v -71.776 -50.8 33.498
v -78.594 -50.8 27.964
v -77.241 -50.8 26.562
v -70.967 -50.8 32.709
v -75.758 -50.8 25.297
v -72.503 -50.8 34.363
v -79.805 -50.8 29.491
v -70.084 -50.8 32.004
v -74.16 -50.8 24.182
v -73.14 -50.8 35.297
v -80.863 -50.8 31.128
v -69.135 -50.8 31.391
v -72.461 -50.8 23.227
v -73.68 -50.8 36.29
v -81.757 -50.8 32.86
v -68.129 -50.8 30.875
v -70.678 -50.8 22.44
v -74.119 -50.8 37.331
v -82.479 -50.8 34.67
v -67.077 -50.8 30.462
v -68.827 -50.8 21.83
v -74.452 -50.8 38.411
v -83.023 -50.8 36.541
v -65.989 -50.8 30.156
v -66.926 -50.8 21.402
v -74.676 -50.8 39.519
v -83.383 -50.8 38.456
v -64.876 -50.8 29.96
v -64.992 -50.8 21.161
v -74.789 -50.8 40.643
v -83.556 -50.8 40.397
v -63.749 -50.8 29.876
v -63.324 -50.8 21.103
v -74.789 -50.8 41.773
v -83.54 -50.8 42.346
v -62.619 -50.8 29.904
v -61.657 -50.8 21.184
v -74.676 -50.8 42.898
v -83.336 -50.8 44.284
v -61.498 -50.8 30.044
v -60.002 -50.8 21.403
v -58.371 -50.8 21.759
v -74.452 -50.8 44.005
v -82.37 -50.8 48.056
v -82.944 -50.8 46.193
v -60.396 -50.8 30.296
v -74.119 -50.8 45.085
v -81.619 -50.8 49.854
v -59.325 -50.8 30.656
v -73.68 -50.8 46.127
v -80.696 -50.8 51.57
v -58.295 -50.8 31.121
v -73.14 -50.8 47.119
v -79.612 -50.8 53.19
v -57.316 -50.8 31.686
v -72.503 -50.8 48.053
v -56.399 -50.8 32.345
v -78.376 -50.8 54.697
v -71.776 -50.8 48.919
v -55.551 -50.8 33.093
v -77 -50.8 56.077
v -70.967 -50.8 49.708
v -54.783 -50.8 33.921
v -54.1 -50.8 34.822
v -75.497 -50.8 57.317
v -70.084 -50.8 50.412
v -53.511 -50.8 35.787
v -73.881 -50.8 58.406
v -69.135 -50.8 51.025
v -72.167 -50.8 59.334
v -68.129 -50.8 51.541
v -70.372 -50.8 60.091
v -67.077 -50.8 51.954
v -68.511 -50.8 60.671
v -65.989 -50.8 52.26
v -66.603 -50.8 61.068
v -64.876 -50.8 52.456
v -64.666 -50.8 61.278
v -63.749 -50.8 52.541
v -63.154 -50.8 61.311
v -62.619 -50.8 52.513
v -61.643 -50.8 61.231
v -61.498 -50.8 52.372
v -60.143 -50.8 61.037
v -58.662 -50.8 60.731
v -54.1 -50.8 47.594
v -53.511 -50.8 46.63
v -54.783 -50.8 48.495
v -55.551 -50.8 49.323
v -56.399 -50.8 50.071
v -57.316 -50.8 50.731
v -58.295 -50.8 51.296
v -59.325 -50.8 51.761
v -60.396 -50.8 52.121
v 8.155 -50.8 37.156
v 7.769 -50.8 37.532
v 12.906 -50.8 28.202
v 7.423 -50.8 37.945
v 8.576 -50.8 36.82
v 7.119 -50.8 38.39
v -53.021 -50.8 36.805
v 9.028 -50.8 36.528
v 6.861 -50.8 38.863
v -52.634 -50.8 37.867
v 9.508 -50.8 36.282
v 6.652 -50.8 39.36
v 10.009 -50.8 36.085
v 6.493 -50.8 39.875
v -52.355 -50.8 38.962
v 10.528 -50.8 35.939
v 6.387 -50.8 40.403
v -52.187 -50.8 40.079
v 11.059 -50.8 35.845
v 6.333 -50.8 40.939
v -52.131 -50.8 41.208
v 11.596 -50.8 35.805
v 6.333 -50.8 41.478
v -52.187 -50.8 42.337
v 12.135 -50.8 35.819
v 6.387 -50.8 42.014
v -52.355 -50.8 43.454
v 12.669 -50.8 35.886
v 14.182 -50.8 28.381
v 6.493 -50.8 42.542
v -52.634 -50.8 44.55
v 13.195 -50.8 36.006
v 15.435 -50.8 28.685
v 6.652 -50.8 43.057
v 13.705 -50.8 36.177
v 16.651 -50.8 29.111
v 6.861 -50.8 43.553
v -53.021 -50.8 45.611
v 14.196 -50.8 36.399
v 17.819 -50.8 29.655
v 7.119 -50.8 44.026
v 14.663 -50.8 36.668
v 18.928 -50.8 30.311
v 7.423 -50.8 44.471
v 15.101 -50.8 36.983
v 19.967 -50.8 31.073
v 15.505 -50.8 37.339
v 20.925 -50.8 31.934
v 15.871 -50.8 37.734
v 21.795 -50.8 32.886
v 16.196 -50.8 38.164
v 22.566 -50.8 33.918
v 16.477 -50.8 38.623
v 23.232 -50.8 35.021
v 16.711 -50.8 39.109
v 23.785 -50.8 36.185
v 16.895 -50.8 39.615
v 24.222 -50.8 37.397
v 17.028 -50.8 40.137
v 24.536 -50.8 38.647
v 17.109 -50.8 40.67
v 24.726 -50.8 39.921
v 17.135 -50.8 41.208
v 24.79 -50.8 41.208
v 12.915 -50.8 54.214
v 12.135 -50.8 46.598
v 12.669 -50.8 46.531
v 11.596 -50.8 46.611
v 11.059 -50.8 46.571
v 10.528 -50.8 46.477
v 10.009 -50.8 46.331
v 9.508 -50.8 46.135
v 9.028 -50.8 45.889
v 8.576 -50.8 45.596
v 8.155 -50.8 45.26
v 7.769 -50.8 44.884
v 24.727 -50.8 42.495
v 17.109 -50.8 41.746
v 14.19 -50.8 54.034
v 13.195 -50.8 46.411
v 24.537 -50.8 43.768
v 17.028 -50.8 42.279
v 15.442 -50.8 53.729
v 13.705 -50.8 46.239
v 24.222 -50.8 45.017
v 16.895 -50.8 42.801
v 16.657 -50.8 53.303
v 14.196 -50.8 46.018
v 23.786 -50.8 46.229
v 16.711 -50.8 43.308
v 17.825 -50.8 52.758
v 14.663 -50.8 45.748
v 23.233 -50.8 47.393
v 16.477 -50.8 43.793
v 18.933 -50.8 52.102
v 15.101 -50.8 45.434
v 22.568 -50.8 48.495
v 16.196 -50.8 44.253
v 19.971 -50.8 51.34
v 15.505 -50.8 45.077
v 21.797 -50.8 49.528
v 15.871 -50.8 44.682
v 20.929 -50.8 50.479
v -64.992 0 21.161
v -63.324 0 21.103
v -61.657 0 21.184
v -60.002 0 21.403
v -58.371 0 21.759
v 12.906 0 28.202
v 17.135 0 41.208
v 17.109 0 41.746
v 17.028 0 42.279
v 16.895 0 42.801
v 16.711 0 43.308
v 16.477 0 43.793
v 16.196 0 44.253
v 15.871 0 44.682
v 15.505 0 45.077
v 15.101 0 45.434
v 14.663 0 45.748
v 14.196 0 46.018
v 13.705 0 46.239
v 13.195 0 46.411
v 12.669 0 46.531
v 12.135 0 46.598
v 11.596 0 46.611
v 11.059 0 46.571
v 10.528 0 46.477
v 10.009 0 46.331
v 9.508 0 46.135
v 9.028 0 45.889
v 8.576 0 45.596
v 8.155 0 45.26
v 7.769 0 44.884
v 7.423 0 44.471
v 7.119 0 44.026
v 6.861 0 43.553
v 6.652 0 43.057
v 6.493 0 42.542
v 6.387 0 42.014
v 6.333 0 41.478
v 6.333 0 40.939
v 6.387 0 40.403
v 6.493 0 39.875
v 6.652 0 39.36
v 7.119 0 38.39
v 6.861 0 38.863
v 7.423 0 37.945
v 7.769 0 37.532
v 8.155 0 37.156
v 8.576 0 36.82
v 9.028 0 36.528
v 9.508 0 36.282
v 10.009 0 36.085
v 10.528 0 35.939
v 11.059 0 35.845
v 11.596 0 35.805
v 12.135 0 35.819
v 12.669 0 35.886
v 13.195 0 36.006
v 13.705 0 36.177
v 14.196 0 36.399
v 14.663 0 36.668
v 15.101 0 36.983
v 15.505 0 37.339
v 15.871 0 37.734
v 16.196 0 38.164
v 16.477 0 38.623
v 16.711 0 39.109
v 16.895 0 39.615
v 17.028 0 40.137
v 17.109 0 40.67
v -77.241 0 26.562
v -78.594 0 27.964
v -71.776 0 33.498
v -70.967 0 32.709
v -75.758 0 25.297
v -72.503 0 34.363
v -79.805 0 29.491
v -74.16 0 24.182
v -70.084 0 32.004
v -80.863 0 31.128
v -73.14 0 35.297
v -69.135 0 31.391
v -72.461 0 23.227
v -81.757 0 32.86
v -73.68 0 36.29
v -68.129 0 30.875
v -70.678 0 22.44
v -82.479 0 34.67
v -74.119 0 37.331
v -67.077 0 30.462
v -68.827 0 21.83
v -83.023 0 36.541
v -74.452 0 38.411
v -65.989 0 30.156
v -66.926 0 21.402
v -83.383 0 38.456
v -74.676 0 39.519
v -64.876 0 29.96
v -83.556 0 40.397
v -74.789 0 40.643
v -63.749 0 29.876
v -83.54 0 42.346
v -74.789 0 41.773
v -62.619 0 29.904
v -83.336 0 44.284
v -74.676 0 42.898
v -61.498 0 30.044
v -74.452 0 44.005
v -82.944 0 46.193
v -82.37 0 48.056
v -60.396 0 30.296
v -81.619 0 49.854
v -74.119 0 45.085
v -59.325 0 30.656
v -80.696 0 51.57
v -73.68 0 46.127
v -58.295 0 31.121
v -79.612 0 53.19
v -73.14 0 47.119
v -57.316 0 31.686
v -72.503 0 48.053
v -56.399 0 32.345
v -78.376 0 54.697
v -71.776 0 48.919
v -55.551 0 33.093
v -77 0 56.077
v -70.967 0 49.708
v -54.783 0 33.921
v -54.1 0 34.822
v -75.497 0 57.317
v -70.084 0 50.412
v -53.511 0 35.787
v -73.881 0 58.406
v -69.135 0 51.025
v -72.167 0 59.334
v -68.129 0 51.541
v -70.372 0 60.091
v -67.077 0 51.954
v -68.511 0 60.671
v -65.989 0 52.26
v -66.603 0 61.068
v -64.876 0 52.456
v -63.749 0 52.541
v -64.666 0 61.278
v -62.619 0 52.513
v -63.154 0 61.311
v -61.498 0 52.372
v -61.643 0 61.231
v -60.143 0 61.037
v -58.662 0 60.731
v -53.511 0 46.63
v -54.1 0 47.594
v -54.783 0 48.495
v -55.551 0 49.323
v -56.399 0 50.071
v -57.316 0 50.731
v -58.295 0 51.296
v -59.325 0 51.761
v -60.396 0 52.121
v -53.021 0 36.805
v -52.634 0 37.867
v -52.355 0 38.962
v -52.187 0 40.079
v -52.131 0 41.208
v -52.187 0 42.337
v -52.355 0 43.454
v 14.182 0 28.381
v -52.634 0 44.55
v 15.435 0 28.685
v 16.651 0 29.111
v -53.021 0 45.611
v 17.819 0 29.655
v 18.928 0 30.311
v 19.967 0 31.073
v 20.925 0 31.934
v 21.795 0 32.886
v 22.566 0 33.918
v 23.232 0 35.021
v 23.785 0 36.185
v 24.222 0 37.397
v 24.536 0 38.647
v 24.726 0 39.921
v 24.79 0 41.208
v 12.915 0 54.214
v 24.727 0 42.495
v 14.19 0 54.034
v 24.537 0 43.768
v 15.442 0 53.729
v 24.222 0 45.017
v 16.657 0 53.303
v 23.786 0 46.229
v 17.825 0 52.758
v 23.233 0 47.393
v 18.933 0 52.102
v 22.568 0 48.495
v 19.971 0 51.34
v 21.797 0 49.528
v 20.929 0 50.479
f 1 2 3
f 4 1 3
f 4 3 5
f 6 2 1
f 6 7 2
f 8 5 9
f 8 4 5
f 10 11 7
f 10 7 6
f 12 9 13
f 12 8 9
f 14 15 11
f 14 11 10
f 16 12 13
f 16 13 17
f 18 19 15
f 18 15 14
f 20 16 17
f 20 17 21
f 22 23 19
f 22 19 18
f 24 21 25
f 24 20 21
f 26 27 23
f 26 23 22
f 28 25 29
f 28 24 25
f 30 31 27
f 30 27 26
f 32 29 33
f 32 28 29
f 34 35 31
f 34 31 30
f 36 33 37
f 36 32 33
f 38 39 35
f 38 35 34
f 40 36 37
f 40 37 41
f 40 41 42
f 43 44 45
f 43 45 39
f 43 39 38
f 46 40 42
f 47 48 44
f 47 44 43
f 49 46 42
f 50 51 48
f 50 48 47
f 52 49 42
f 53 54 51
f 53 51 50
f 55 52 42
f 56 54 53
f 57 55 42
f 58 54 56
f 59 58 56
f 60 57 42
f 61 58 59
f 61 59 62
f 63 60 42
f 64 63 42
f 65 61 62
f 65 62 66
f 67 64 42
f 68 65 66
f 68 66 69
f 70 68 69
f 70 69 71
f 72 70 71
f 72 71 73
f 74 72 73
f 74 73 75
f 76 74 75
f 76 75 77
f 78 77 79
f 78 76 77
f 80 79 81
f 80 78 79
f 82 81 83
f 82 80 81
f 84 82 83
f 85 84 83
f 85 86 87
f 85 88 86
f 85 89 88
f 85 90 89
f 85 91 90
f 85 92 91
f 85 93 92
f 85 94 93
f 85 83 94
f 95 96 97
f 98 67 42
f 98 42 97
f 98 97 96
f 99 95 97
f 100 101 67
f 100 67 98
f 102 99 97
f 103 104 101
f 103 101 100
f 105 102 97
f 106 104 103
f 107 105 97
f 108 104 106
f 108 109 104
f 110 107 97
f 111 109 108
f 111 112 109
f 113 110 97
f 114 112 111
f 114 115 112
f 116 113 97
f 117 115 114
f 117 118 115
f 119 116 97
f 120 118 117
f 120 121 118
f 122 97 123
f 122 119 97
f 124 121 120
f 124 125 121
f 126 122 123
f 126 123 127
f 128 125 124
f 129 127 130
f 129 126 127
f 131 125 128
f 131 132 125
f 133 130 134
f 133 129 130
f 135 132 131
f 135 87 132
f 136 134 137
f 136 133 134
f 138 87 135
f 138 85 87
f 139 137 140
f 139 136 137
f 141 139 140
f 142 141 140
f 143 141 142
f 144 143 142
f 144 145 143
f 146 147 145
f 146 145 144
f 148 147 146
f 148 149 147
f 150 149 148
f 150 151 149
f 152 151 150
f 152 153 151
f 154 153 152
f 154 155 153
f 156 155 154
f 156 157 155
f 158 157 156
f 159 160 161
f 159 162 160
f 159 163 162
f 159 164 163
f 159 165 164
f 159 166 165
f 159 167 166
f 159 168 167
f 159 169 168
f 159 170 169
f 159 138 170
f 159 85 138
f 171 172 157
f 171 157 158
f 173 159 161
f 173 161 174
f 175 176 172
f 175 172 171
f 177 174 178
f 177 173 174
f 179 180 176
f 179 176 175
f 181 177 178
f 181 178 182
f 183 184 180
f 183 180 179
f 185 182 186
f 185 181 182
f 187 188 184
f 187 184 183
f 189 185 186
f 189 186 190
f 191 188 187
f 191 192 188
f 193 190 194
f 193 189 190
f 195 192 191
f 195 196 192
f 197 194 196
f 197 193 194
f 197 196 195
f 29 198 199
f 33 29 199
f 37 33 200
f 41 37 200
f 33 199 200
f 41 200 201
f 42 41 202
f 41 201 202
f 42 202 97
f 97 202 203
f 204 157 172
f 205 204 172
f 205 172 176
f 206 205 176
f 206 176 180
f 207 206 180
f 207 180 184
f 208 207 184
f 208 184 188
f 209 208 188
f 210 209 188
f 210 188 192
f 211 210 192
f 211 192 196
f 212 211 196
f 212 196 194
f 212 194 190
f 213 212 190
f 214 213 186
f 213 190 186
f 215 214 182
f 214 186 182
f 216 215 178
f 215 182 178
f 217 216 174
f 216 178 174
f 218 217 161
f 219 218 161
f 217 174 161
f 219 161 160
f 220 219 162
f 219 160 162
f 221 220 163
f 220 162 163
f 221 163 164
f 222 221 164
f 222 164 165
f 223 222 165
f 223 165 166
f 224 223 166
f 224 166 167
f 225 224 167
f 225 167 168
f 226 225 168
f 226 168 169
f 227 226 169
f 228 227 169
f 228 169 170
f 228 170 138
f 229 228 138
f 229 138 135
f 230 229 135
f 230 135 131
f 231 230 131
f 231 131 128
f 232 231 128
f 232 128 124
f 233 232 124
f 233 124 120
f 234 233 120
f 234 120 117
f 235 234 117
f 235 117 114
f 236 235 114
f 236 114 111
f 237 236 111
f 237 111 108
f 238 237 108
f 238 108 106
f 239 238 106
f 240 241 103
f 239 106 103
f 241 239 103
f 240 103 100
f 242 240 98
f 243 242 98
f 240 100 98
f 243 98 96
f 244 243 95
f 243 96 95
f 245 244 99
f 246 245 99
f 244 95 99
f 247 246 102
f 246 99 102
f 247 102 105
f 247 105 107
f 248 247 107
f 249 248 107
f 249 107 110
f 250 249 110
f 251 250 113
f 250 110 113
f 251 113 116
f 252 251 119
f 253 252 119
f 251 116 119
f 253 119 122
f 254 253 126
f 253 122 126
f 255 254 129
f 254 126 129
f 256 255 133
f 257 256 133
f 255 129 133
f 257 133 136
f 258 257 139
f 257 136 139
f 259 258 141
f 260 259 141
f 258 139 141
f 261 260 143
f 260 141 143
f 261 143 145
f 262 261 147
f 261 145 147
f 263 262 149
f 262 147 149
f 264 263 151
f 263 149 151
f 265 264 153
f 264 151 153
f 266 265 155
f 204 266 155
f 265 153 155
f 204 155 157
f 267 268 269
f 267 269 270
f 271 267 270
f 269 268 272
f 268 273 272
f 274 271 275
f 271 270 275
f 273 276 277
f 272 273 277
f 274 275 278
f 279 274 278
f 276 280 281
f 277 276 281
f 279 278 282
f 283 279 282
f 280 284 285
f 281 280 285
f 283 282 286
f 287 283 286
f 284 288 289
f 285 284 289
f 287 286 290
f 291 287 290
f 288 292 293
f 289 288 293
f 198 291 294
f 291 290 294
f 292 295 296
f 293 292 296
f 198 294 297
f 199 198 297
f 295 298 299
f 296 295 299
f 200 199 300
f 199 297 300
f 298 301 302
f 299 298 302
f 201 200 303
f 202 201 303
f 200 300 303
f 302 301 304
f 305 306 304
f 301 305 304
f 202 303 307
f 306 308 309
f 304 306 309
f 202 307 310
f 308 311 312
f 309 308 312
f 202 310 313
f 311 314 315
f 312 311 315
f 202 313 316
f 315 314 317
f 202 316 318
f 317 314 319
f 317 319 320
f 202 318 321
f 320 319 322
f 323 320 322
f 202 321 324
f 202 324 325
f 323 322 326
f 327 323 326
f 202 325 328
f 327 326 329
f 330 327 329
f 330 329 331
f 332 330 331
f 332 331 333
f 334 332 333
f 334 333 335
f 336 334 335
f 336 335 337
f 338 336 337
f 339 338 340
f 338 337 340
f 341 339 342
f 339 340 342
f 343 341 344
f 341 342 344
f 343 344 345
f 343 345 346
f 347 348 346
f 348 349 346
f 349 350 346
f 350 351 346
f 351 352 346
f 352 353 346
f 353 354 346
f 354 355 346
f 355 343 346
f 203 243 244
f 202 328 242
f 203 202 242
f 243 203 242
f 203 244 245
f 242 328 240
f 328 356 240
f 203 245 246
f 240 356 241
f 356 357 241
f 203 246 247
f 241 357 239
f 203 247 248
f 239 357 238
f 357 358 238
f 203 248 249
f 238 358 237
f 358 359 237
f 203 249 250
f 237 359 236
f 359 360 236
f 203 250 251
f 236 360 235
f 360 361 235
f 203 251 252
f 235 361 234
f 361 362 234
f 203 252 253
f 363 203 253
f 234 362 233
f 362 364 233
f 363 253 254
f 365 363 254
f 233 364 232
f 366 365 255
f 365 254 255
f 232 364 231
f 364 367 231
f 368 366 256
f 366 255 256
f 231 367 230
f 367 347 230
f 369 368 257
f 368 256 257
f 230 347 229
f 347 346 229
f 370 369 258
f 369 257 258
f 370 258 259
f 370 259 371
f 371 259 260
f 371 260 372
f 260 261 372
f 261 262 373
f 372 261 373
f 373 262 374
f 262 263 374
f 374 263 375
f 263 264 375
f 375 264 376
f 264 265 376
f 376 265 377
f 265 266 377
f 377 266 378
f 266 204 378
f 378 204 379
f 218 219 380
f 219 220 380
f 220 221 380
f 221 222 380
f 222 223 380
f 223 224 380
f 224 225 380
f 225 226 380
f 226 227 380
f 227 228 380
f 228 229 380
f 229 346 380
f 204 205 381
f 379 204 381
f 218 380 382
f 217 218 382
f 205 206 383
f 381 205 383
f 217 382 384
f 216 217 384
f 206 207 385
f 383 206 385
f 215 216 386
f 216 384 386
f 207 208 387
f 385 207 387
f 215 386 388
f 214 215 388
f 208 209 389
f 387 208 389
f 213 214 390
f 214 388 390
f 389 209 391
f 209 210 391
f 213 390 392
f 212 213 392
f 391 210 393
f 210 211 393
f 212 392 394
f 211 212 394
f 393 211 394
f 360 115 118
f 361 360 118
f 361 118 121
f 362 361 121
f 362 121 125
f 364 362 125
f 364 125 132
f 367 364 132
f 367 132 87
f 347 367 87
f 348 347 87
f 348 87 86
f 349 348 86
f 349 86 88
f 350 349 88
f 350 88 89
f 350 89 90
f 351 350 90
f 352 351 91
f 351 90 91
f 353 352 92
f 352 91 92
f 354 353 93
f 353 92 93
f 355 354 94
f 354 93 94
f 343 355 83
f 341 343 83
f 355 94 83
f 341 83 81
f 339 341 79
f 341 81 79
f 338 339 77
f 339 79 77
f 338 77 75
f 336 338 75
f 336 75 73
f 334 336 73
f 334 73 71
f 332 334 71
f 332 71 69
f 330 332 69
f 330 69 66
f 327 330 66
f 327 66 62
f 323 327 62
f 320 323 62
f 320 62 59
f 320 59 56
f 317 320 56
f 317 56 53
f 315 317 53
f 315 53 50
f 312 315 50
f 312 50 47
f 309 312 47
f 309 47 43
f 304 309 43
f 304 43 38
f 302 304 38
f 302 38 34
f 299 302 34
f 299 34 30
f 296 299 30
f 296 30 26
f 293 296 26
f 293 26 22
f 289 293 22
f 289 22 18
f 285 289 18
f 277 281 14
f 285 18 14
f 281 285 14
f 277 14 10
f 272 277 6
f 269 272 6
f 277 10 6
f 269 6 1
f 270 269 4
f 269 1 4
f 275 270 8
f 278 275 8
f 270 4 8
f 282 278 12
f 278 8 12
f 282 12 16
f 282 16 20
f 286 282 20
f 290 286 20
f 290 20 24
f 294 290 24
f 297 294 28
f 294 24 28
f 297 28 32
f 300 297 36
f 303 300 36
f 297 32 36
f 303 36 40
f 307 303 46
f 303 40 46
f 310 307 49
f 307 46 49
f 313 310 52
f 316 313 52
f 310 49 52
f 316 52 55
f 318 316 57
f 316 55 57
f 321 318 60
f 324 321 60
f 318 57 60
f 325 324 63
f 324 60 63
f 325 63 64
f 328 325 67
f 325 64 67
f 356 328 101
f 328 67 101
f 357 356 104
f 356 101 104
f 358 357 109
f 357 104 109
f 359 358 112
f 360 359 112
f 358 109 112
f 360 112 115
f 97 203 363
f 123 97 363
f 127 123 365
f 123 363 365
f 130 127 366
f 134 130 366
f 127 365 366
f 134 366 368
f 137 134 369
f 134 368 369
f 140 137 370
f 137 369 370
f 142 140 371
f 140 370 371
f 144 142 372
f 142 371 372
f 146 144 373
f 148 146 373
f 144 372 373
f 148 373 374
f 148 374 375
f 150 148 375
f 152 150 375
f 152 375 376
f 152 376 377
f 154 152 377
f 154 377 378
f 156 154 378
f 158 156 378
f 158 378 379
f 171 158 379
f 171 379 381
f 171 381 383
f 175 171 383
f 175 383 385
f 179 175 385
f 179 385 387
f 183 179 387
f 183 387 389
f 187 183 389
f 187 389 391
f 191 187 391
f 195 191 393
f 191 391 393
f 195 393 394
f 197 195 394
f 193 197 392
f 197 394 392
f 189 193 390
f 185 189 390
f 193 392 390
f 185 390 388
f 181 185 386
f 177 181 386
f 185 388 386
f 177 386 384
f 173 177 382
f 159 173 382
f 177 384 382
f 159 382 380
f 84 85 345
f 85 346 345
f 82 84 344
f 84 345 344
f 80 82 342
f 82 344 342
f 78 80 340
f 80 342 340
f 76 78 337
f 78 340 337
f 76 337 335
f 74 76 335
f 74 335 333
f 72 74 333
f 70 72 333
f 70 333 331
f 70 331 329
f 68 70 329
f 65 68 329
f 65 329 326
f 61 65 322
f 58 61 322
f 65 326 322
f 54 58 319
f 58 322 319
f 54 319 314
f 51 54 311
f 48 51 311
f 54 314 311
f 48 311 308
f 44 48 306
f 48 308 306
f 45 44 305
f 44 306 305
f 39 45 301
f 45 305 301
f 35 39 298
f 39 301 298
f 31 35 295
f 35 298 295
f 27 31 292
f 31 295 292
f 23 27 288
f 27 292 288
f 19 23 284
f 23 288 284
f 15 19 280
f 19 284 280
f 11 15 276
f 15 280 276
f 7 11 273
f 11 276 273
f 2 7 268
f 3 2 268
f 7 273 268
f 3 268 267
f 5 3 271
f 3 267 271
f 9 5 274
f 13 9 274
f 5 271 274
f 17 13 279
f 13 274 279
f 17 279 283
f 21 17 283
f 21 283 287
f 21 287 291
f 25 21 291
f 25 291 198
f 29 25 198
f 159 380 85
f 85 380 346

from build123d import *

# Parameters (mm, degrees)
F0_R     = 5.7858017693
F0_R_2   = 12.2144234622
F1_DEPTH = 25.4
F2_R     = 6.35
F3_DEPTH = 25.4
F4_DEPTH = 25.4
F5_R     = 11.3360487182
F5_R_2   = 5.404630024
F6_DEPTH = 143.764


with BuildPart() as f1:
    # F0 (on Front) → F1 (new body)
    with BuildSketch(Plane.XZ):
        with BuildLine():
            Line((12.9150417295, 54.2136049138), (-58.6621068715, 60.7312914672))
            ThreePointArc((-58.6621068715, 60.7312914672), (-47.6420330376, 53.6105540281), (-43.3609664676, 41.2081591785))
            ThreePointArc((-43.3609664676, 41.2081591785), (-47.549687182, 28.9245030523), (-58.370527571, 21.7590999007))
            Line((-58.370527571, 21.7590999007), (12.9064416896, 28.2019332059))
            ThreePointArc((12.9064416896, 28.2019332059), (-1.3284624626, 41.2124768589), (12.9150417295, 54.2136049138))
        make_face()
        with BuildLine():
            ThreePointArc((24.7900415902, 41.2081591785), (21.374686899, 50.0137999909), (12.9150417295, 54.2136049138))
            ThreePointArc((12.9150417295, 54.2136049138), (-1.3284624626, 41.2124768589), (12.9064416896, 28.2019332059))
            ThreePointArc((12.9064416896, 28.2019332059), (21.3717750304, 32.3993303595), (24.7900415902, 41.2081591785))
        make_face()
        with Locations((11.7307892069, 41.2081591785)):
            Circle(F0_R, mode=Mode.SUBTRACT)
        with BuildLine():
            ThreePointArc((-58.6621068715, 60.7312914672), (-61.6433409645, 61.2309324181), (-64.6657877732, 61.2779758637))
            Line((-64.6657877732, 61.2779758637), (-58.6621068715, 60.7312914672))
        make_face()
        with BuildLine():
            Line((-58.370527571, 21.7590999007), (-64.9924645965, 21.1605329743))
            ThreePointArc((-64.9924645965, 21.1605329743), (-61.6565813141, 21.1841847102), (-58.370527571, 21.7590999007))
        make_face()
        with Locations((11.7307892069, 41.2081591785)):
            Circle(F0_R)
        with BuildLine():
            Line((-58.6621068715, 60.7312914672), (-64.6657877732, 61.2779758637))
            ThreePointArc((-64.6657877732, 61.2779758637), (-83.5715244216, 41.3718739948), (-64.9924645965, 21.1605329743))
            Line((-64.9924645965, 21.1605329743), (-58.370527571, 21.7590999007))
            ThreePointArc((-58.370527571, 21.7590999007), (-47.549687182, 28.9245030523), (-43.3609664676, 41.2081591785))
            ThreePointArc((-43.3609664676, 41.2081591785), (-47.6420330376, 53.6105540281), (-58.6621068715, 60.7312914672))
        make_face()
        with Locations((-63.466578722, 41.2081591785)):
            Circle(F0_R_2, mode=Mode.SUBTRACT)
        with Locations((-63.466578722, 41.2081591785)):
            Circle(F0_R_2)
    extrude(amount=F1_DEPTH)

    # F4 (add): a face of the model
    f4_faces = [f1.faces().sort_by_distance(p)[0] for p in [
        (-33.0156051896, -25.4, 41.2168506506),
    ]]
    extrude(f4_faces, amount=F4_DEPTH)

    # F5 (on face) → F6 (cut)
    with BuildSketch(Plane.XZ.offset(50.8)):
        with Locations((-63.466578722, 41.2081591785)):
            Circle(F5_R)
        with Locations((11.7307892069, 41.2081591785)):
            Circle(F5_R_2)
    extrude(amount=-F6_DEPTH, mode=Mode.SUBTRACT)


with BuildPart() as f3:
    # F2 (on Front) → F3 (new body)
    with BuildSketch(Plane.XZ):
        with Locations((-100.2000197768, -20.0504176319)):
            Circle(F2_R)
    extrude(amount=F3_DEPTH)


solid = f1.part
